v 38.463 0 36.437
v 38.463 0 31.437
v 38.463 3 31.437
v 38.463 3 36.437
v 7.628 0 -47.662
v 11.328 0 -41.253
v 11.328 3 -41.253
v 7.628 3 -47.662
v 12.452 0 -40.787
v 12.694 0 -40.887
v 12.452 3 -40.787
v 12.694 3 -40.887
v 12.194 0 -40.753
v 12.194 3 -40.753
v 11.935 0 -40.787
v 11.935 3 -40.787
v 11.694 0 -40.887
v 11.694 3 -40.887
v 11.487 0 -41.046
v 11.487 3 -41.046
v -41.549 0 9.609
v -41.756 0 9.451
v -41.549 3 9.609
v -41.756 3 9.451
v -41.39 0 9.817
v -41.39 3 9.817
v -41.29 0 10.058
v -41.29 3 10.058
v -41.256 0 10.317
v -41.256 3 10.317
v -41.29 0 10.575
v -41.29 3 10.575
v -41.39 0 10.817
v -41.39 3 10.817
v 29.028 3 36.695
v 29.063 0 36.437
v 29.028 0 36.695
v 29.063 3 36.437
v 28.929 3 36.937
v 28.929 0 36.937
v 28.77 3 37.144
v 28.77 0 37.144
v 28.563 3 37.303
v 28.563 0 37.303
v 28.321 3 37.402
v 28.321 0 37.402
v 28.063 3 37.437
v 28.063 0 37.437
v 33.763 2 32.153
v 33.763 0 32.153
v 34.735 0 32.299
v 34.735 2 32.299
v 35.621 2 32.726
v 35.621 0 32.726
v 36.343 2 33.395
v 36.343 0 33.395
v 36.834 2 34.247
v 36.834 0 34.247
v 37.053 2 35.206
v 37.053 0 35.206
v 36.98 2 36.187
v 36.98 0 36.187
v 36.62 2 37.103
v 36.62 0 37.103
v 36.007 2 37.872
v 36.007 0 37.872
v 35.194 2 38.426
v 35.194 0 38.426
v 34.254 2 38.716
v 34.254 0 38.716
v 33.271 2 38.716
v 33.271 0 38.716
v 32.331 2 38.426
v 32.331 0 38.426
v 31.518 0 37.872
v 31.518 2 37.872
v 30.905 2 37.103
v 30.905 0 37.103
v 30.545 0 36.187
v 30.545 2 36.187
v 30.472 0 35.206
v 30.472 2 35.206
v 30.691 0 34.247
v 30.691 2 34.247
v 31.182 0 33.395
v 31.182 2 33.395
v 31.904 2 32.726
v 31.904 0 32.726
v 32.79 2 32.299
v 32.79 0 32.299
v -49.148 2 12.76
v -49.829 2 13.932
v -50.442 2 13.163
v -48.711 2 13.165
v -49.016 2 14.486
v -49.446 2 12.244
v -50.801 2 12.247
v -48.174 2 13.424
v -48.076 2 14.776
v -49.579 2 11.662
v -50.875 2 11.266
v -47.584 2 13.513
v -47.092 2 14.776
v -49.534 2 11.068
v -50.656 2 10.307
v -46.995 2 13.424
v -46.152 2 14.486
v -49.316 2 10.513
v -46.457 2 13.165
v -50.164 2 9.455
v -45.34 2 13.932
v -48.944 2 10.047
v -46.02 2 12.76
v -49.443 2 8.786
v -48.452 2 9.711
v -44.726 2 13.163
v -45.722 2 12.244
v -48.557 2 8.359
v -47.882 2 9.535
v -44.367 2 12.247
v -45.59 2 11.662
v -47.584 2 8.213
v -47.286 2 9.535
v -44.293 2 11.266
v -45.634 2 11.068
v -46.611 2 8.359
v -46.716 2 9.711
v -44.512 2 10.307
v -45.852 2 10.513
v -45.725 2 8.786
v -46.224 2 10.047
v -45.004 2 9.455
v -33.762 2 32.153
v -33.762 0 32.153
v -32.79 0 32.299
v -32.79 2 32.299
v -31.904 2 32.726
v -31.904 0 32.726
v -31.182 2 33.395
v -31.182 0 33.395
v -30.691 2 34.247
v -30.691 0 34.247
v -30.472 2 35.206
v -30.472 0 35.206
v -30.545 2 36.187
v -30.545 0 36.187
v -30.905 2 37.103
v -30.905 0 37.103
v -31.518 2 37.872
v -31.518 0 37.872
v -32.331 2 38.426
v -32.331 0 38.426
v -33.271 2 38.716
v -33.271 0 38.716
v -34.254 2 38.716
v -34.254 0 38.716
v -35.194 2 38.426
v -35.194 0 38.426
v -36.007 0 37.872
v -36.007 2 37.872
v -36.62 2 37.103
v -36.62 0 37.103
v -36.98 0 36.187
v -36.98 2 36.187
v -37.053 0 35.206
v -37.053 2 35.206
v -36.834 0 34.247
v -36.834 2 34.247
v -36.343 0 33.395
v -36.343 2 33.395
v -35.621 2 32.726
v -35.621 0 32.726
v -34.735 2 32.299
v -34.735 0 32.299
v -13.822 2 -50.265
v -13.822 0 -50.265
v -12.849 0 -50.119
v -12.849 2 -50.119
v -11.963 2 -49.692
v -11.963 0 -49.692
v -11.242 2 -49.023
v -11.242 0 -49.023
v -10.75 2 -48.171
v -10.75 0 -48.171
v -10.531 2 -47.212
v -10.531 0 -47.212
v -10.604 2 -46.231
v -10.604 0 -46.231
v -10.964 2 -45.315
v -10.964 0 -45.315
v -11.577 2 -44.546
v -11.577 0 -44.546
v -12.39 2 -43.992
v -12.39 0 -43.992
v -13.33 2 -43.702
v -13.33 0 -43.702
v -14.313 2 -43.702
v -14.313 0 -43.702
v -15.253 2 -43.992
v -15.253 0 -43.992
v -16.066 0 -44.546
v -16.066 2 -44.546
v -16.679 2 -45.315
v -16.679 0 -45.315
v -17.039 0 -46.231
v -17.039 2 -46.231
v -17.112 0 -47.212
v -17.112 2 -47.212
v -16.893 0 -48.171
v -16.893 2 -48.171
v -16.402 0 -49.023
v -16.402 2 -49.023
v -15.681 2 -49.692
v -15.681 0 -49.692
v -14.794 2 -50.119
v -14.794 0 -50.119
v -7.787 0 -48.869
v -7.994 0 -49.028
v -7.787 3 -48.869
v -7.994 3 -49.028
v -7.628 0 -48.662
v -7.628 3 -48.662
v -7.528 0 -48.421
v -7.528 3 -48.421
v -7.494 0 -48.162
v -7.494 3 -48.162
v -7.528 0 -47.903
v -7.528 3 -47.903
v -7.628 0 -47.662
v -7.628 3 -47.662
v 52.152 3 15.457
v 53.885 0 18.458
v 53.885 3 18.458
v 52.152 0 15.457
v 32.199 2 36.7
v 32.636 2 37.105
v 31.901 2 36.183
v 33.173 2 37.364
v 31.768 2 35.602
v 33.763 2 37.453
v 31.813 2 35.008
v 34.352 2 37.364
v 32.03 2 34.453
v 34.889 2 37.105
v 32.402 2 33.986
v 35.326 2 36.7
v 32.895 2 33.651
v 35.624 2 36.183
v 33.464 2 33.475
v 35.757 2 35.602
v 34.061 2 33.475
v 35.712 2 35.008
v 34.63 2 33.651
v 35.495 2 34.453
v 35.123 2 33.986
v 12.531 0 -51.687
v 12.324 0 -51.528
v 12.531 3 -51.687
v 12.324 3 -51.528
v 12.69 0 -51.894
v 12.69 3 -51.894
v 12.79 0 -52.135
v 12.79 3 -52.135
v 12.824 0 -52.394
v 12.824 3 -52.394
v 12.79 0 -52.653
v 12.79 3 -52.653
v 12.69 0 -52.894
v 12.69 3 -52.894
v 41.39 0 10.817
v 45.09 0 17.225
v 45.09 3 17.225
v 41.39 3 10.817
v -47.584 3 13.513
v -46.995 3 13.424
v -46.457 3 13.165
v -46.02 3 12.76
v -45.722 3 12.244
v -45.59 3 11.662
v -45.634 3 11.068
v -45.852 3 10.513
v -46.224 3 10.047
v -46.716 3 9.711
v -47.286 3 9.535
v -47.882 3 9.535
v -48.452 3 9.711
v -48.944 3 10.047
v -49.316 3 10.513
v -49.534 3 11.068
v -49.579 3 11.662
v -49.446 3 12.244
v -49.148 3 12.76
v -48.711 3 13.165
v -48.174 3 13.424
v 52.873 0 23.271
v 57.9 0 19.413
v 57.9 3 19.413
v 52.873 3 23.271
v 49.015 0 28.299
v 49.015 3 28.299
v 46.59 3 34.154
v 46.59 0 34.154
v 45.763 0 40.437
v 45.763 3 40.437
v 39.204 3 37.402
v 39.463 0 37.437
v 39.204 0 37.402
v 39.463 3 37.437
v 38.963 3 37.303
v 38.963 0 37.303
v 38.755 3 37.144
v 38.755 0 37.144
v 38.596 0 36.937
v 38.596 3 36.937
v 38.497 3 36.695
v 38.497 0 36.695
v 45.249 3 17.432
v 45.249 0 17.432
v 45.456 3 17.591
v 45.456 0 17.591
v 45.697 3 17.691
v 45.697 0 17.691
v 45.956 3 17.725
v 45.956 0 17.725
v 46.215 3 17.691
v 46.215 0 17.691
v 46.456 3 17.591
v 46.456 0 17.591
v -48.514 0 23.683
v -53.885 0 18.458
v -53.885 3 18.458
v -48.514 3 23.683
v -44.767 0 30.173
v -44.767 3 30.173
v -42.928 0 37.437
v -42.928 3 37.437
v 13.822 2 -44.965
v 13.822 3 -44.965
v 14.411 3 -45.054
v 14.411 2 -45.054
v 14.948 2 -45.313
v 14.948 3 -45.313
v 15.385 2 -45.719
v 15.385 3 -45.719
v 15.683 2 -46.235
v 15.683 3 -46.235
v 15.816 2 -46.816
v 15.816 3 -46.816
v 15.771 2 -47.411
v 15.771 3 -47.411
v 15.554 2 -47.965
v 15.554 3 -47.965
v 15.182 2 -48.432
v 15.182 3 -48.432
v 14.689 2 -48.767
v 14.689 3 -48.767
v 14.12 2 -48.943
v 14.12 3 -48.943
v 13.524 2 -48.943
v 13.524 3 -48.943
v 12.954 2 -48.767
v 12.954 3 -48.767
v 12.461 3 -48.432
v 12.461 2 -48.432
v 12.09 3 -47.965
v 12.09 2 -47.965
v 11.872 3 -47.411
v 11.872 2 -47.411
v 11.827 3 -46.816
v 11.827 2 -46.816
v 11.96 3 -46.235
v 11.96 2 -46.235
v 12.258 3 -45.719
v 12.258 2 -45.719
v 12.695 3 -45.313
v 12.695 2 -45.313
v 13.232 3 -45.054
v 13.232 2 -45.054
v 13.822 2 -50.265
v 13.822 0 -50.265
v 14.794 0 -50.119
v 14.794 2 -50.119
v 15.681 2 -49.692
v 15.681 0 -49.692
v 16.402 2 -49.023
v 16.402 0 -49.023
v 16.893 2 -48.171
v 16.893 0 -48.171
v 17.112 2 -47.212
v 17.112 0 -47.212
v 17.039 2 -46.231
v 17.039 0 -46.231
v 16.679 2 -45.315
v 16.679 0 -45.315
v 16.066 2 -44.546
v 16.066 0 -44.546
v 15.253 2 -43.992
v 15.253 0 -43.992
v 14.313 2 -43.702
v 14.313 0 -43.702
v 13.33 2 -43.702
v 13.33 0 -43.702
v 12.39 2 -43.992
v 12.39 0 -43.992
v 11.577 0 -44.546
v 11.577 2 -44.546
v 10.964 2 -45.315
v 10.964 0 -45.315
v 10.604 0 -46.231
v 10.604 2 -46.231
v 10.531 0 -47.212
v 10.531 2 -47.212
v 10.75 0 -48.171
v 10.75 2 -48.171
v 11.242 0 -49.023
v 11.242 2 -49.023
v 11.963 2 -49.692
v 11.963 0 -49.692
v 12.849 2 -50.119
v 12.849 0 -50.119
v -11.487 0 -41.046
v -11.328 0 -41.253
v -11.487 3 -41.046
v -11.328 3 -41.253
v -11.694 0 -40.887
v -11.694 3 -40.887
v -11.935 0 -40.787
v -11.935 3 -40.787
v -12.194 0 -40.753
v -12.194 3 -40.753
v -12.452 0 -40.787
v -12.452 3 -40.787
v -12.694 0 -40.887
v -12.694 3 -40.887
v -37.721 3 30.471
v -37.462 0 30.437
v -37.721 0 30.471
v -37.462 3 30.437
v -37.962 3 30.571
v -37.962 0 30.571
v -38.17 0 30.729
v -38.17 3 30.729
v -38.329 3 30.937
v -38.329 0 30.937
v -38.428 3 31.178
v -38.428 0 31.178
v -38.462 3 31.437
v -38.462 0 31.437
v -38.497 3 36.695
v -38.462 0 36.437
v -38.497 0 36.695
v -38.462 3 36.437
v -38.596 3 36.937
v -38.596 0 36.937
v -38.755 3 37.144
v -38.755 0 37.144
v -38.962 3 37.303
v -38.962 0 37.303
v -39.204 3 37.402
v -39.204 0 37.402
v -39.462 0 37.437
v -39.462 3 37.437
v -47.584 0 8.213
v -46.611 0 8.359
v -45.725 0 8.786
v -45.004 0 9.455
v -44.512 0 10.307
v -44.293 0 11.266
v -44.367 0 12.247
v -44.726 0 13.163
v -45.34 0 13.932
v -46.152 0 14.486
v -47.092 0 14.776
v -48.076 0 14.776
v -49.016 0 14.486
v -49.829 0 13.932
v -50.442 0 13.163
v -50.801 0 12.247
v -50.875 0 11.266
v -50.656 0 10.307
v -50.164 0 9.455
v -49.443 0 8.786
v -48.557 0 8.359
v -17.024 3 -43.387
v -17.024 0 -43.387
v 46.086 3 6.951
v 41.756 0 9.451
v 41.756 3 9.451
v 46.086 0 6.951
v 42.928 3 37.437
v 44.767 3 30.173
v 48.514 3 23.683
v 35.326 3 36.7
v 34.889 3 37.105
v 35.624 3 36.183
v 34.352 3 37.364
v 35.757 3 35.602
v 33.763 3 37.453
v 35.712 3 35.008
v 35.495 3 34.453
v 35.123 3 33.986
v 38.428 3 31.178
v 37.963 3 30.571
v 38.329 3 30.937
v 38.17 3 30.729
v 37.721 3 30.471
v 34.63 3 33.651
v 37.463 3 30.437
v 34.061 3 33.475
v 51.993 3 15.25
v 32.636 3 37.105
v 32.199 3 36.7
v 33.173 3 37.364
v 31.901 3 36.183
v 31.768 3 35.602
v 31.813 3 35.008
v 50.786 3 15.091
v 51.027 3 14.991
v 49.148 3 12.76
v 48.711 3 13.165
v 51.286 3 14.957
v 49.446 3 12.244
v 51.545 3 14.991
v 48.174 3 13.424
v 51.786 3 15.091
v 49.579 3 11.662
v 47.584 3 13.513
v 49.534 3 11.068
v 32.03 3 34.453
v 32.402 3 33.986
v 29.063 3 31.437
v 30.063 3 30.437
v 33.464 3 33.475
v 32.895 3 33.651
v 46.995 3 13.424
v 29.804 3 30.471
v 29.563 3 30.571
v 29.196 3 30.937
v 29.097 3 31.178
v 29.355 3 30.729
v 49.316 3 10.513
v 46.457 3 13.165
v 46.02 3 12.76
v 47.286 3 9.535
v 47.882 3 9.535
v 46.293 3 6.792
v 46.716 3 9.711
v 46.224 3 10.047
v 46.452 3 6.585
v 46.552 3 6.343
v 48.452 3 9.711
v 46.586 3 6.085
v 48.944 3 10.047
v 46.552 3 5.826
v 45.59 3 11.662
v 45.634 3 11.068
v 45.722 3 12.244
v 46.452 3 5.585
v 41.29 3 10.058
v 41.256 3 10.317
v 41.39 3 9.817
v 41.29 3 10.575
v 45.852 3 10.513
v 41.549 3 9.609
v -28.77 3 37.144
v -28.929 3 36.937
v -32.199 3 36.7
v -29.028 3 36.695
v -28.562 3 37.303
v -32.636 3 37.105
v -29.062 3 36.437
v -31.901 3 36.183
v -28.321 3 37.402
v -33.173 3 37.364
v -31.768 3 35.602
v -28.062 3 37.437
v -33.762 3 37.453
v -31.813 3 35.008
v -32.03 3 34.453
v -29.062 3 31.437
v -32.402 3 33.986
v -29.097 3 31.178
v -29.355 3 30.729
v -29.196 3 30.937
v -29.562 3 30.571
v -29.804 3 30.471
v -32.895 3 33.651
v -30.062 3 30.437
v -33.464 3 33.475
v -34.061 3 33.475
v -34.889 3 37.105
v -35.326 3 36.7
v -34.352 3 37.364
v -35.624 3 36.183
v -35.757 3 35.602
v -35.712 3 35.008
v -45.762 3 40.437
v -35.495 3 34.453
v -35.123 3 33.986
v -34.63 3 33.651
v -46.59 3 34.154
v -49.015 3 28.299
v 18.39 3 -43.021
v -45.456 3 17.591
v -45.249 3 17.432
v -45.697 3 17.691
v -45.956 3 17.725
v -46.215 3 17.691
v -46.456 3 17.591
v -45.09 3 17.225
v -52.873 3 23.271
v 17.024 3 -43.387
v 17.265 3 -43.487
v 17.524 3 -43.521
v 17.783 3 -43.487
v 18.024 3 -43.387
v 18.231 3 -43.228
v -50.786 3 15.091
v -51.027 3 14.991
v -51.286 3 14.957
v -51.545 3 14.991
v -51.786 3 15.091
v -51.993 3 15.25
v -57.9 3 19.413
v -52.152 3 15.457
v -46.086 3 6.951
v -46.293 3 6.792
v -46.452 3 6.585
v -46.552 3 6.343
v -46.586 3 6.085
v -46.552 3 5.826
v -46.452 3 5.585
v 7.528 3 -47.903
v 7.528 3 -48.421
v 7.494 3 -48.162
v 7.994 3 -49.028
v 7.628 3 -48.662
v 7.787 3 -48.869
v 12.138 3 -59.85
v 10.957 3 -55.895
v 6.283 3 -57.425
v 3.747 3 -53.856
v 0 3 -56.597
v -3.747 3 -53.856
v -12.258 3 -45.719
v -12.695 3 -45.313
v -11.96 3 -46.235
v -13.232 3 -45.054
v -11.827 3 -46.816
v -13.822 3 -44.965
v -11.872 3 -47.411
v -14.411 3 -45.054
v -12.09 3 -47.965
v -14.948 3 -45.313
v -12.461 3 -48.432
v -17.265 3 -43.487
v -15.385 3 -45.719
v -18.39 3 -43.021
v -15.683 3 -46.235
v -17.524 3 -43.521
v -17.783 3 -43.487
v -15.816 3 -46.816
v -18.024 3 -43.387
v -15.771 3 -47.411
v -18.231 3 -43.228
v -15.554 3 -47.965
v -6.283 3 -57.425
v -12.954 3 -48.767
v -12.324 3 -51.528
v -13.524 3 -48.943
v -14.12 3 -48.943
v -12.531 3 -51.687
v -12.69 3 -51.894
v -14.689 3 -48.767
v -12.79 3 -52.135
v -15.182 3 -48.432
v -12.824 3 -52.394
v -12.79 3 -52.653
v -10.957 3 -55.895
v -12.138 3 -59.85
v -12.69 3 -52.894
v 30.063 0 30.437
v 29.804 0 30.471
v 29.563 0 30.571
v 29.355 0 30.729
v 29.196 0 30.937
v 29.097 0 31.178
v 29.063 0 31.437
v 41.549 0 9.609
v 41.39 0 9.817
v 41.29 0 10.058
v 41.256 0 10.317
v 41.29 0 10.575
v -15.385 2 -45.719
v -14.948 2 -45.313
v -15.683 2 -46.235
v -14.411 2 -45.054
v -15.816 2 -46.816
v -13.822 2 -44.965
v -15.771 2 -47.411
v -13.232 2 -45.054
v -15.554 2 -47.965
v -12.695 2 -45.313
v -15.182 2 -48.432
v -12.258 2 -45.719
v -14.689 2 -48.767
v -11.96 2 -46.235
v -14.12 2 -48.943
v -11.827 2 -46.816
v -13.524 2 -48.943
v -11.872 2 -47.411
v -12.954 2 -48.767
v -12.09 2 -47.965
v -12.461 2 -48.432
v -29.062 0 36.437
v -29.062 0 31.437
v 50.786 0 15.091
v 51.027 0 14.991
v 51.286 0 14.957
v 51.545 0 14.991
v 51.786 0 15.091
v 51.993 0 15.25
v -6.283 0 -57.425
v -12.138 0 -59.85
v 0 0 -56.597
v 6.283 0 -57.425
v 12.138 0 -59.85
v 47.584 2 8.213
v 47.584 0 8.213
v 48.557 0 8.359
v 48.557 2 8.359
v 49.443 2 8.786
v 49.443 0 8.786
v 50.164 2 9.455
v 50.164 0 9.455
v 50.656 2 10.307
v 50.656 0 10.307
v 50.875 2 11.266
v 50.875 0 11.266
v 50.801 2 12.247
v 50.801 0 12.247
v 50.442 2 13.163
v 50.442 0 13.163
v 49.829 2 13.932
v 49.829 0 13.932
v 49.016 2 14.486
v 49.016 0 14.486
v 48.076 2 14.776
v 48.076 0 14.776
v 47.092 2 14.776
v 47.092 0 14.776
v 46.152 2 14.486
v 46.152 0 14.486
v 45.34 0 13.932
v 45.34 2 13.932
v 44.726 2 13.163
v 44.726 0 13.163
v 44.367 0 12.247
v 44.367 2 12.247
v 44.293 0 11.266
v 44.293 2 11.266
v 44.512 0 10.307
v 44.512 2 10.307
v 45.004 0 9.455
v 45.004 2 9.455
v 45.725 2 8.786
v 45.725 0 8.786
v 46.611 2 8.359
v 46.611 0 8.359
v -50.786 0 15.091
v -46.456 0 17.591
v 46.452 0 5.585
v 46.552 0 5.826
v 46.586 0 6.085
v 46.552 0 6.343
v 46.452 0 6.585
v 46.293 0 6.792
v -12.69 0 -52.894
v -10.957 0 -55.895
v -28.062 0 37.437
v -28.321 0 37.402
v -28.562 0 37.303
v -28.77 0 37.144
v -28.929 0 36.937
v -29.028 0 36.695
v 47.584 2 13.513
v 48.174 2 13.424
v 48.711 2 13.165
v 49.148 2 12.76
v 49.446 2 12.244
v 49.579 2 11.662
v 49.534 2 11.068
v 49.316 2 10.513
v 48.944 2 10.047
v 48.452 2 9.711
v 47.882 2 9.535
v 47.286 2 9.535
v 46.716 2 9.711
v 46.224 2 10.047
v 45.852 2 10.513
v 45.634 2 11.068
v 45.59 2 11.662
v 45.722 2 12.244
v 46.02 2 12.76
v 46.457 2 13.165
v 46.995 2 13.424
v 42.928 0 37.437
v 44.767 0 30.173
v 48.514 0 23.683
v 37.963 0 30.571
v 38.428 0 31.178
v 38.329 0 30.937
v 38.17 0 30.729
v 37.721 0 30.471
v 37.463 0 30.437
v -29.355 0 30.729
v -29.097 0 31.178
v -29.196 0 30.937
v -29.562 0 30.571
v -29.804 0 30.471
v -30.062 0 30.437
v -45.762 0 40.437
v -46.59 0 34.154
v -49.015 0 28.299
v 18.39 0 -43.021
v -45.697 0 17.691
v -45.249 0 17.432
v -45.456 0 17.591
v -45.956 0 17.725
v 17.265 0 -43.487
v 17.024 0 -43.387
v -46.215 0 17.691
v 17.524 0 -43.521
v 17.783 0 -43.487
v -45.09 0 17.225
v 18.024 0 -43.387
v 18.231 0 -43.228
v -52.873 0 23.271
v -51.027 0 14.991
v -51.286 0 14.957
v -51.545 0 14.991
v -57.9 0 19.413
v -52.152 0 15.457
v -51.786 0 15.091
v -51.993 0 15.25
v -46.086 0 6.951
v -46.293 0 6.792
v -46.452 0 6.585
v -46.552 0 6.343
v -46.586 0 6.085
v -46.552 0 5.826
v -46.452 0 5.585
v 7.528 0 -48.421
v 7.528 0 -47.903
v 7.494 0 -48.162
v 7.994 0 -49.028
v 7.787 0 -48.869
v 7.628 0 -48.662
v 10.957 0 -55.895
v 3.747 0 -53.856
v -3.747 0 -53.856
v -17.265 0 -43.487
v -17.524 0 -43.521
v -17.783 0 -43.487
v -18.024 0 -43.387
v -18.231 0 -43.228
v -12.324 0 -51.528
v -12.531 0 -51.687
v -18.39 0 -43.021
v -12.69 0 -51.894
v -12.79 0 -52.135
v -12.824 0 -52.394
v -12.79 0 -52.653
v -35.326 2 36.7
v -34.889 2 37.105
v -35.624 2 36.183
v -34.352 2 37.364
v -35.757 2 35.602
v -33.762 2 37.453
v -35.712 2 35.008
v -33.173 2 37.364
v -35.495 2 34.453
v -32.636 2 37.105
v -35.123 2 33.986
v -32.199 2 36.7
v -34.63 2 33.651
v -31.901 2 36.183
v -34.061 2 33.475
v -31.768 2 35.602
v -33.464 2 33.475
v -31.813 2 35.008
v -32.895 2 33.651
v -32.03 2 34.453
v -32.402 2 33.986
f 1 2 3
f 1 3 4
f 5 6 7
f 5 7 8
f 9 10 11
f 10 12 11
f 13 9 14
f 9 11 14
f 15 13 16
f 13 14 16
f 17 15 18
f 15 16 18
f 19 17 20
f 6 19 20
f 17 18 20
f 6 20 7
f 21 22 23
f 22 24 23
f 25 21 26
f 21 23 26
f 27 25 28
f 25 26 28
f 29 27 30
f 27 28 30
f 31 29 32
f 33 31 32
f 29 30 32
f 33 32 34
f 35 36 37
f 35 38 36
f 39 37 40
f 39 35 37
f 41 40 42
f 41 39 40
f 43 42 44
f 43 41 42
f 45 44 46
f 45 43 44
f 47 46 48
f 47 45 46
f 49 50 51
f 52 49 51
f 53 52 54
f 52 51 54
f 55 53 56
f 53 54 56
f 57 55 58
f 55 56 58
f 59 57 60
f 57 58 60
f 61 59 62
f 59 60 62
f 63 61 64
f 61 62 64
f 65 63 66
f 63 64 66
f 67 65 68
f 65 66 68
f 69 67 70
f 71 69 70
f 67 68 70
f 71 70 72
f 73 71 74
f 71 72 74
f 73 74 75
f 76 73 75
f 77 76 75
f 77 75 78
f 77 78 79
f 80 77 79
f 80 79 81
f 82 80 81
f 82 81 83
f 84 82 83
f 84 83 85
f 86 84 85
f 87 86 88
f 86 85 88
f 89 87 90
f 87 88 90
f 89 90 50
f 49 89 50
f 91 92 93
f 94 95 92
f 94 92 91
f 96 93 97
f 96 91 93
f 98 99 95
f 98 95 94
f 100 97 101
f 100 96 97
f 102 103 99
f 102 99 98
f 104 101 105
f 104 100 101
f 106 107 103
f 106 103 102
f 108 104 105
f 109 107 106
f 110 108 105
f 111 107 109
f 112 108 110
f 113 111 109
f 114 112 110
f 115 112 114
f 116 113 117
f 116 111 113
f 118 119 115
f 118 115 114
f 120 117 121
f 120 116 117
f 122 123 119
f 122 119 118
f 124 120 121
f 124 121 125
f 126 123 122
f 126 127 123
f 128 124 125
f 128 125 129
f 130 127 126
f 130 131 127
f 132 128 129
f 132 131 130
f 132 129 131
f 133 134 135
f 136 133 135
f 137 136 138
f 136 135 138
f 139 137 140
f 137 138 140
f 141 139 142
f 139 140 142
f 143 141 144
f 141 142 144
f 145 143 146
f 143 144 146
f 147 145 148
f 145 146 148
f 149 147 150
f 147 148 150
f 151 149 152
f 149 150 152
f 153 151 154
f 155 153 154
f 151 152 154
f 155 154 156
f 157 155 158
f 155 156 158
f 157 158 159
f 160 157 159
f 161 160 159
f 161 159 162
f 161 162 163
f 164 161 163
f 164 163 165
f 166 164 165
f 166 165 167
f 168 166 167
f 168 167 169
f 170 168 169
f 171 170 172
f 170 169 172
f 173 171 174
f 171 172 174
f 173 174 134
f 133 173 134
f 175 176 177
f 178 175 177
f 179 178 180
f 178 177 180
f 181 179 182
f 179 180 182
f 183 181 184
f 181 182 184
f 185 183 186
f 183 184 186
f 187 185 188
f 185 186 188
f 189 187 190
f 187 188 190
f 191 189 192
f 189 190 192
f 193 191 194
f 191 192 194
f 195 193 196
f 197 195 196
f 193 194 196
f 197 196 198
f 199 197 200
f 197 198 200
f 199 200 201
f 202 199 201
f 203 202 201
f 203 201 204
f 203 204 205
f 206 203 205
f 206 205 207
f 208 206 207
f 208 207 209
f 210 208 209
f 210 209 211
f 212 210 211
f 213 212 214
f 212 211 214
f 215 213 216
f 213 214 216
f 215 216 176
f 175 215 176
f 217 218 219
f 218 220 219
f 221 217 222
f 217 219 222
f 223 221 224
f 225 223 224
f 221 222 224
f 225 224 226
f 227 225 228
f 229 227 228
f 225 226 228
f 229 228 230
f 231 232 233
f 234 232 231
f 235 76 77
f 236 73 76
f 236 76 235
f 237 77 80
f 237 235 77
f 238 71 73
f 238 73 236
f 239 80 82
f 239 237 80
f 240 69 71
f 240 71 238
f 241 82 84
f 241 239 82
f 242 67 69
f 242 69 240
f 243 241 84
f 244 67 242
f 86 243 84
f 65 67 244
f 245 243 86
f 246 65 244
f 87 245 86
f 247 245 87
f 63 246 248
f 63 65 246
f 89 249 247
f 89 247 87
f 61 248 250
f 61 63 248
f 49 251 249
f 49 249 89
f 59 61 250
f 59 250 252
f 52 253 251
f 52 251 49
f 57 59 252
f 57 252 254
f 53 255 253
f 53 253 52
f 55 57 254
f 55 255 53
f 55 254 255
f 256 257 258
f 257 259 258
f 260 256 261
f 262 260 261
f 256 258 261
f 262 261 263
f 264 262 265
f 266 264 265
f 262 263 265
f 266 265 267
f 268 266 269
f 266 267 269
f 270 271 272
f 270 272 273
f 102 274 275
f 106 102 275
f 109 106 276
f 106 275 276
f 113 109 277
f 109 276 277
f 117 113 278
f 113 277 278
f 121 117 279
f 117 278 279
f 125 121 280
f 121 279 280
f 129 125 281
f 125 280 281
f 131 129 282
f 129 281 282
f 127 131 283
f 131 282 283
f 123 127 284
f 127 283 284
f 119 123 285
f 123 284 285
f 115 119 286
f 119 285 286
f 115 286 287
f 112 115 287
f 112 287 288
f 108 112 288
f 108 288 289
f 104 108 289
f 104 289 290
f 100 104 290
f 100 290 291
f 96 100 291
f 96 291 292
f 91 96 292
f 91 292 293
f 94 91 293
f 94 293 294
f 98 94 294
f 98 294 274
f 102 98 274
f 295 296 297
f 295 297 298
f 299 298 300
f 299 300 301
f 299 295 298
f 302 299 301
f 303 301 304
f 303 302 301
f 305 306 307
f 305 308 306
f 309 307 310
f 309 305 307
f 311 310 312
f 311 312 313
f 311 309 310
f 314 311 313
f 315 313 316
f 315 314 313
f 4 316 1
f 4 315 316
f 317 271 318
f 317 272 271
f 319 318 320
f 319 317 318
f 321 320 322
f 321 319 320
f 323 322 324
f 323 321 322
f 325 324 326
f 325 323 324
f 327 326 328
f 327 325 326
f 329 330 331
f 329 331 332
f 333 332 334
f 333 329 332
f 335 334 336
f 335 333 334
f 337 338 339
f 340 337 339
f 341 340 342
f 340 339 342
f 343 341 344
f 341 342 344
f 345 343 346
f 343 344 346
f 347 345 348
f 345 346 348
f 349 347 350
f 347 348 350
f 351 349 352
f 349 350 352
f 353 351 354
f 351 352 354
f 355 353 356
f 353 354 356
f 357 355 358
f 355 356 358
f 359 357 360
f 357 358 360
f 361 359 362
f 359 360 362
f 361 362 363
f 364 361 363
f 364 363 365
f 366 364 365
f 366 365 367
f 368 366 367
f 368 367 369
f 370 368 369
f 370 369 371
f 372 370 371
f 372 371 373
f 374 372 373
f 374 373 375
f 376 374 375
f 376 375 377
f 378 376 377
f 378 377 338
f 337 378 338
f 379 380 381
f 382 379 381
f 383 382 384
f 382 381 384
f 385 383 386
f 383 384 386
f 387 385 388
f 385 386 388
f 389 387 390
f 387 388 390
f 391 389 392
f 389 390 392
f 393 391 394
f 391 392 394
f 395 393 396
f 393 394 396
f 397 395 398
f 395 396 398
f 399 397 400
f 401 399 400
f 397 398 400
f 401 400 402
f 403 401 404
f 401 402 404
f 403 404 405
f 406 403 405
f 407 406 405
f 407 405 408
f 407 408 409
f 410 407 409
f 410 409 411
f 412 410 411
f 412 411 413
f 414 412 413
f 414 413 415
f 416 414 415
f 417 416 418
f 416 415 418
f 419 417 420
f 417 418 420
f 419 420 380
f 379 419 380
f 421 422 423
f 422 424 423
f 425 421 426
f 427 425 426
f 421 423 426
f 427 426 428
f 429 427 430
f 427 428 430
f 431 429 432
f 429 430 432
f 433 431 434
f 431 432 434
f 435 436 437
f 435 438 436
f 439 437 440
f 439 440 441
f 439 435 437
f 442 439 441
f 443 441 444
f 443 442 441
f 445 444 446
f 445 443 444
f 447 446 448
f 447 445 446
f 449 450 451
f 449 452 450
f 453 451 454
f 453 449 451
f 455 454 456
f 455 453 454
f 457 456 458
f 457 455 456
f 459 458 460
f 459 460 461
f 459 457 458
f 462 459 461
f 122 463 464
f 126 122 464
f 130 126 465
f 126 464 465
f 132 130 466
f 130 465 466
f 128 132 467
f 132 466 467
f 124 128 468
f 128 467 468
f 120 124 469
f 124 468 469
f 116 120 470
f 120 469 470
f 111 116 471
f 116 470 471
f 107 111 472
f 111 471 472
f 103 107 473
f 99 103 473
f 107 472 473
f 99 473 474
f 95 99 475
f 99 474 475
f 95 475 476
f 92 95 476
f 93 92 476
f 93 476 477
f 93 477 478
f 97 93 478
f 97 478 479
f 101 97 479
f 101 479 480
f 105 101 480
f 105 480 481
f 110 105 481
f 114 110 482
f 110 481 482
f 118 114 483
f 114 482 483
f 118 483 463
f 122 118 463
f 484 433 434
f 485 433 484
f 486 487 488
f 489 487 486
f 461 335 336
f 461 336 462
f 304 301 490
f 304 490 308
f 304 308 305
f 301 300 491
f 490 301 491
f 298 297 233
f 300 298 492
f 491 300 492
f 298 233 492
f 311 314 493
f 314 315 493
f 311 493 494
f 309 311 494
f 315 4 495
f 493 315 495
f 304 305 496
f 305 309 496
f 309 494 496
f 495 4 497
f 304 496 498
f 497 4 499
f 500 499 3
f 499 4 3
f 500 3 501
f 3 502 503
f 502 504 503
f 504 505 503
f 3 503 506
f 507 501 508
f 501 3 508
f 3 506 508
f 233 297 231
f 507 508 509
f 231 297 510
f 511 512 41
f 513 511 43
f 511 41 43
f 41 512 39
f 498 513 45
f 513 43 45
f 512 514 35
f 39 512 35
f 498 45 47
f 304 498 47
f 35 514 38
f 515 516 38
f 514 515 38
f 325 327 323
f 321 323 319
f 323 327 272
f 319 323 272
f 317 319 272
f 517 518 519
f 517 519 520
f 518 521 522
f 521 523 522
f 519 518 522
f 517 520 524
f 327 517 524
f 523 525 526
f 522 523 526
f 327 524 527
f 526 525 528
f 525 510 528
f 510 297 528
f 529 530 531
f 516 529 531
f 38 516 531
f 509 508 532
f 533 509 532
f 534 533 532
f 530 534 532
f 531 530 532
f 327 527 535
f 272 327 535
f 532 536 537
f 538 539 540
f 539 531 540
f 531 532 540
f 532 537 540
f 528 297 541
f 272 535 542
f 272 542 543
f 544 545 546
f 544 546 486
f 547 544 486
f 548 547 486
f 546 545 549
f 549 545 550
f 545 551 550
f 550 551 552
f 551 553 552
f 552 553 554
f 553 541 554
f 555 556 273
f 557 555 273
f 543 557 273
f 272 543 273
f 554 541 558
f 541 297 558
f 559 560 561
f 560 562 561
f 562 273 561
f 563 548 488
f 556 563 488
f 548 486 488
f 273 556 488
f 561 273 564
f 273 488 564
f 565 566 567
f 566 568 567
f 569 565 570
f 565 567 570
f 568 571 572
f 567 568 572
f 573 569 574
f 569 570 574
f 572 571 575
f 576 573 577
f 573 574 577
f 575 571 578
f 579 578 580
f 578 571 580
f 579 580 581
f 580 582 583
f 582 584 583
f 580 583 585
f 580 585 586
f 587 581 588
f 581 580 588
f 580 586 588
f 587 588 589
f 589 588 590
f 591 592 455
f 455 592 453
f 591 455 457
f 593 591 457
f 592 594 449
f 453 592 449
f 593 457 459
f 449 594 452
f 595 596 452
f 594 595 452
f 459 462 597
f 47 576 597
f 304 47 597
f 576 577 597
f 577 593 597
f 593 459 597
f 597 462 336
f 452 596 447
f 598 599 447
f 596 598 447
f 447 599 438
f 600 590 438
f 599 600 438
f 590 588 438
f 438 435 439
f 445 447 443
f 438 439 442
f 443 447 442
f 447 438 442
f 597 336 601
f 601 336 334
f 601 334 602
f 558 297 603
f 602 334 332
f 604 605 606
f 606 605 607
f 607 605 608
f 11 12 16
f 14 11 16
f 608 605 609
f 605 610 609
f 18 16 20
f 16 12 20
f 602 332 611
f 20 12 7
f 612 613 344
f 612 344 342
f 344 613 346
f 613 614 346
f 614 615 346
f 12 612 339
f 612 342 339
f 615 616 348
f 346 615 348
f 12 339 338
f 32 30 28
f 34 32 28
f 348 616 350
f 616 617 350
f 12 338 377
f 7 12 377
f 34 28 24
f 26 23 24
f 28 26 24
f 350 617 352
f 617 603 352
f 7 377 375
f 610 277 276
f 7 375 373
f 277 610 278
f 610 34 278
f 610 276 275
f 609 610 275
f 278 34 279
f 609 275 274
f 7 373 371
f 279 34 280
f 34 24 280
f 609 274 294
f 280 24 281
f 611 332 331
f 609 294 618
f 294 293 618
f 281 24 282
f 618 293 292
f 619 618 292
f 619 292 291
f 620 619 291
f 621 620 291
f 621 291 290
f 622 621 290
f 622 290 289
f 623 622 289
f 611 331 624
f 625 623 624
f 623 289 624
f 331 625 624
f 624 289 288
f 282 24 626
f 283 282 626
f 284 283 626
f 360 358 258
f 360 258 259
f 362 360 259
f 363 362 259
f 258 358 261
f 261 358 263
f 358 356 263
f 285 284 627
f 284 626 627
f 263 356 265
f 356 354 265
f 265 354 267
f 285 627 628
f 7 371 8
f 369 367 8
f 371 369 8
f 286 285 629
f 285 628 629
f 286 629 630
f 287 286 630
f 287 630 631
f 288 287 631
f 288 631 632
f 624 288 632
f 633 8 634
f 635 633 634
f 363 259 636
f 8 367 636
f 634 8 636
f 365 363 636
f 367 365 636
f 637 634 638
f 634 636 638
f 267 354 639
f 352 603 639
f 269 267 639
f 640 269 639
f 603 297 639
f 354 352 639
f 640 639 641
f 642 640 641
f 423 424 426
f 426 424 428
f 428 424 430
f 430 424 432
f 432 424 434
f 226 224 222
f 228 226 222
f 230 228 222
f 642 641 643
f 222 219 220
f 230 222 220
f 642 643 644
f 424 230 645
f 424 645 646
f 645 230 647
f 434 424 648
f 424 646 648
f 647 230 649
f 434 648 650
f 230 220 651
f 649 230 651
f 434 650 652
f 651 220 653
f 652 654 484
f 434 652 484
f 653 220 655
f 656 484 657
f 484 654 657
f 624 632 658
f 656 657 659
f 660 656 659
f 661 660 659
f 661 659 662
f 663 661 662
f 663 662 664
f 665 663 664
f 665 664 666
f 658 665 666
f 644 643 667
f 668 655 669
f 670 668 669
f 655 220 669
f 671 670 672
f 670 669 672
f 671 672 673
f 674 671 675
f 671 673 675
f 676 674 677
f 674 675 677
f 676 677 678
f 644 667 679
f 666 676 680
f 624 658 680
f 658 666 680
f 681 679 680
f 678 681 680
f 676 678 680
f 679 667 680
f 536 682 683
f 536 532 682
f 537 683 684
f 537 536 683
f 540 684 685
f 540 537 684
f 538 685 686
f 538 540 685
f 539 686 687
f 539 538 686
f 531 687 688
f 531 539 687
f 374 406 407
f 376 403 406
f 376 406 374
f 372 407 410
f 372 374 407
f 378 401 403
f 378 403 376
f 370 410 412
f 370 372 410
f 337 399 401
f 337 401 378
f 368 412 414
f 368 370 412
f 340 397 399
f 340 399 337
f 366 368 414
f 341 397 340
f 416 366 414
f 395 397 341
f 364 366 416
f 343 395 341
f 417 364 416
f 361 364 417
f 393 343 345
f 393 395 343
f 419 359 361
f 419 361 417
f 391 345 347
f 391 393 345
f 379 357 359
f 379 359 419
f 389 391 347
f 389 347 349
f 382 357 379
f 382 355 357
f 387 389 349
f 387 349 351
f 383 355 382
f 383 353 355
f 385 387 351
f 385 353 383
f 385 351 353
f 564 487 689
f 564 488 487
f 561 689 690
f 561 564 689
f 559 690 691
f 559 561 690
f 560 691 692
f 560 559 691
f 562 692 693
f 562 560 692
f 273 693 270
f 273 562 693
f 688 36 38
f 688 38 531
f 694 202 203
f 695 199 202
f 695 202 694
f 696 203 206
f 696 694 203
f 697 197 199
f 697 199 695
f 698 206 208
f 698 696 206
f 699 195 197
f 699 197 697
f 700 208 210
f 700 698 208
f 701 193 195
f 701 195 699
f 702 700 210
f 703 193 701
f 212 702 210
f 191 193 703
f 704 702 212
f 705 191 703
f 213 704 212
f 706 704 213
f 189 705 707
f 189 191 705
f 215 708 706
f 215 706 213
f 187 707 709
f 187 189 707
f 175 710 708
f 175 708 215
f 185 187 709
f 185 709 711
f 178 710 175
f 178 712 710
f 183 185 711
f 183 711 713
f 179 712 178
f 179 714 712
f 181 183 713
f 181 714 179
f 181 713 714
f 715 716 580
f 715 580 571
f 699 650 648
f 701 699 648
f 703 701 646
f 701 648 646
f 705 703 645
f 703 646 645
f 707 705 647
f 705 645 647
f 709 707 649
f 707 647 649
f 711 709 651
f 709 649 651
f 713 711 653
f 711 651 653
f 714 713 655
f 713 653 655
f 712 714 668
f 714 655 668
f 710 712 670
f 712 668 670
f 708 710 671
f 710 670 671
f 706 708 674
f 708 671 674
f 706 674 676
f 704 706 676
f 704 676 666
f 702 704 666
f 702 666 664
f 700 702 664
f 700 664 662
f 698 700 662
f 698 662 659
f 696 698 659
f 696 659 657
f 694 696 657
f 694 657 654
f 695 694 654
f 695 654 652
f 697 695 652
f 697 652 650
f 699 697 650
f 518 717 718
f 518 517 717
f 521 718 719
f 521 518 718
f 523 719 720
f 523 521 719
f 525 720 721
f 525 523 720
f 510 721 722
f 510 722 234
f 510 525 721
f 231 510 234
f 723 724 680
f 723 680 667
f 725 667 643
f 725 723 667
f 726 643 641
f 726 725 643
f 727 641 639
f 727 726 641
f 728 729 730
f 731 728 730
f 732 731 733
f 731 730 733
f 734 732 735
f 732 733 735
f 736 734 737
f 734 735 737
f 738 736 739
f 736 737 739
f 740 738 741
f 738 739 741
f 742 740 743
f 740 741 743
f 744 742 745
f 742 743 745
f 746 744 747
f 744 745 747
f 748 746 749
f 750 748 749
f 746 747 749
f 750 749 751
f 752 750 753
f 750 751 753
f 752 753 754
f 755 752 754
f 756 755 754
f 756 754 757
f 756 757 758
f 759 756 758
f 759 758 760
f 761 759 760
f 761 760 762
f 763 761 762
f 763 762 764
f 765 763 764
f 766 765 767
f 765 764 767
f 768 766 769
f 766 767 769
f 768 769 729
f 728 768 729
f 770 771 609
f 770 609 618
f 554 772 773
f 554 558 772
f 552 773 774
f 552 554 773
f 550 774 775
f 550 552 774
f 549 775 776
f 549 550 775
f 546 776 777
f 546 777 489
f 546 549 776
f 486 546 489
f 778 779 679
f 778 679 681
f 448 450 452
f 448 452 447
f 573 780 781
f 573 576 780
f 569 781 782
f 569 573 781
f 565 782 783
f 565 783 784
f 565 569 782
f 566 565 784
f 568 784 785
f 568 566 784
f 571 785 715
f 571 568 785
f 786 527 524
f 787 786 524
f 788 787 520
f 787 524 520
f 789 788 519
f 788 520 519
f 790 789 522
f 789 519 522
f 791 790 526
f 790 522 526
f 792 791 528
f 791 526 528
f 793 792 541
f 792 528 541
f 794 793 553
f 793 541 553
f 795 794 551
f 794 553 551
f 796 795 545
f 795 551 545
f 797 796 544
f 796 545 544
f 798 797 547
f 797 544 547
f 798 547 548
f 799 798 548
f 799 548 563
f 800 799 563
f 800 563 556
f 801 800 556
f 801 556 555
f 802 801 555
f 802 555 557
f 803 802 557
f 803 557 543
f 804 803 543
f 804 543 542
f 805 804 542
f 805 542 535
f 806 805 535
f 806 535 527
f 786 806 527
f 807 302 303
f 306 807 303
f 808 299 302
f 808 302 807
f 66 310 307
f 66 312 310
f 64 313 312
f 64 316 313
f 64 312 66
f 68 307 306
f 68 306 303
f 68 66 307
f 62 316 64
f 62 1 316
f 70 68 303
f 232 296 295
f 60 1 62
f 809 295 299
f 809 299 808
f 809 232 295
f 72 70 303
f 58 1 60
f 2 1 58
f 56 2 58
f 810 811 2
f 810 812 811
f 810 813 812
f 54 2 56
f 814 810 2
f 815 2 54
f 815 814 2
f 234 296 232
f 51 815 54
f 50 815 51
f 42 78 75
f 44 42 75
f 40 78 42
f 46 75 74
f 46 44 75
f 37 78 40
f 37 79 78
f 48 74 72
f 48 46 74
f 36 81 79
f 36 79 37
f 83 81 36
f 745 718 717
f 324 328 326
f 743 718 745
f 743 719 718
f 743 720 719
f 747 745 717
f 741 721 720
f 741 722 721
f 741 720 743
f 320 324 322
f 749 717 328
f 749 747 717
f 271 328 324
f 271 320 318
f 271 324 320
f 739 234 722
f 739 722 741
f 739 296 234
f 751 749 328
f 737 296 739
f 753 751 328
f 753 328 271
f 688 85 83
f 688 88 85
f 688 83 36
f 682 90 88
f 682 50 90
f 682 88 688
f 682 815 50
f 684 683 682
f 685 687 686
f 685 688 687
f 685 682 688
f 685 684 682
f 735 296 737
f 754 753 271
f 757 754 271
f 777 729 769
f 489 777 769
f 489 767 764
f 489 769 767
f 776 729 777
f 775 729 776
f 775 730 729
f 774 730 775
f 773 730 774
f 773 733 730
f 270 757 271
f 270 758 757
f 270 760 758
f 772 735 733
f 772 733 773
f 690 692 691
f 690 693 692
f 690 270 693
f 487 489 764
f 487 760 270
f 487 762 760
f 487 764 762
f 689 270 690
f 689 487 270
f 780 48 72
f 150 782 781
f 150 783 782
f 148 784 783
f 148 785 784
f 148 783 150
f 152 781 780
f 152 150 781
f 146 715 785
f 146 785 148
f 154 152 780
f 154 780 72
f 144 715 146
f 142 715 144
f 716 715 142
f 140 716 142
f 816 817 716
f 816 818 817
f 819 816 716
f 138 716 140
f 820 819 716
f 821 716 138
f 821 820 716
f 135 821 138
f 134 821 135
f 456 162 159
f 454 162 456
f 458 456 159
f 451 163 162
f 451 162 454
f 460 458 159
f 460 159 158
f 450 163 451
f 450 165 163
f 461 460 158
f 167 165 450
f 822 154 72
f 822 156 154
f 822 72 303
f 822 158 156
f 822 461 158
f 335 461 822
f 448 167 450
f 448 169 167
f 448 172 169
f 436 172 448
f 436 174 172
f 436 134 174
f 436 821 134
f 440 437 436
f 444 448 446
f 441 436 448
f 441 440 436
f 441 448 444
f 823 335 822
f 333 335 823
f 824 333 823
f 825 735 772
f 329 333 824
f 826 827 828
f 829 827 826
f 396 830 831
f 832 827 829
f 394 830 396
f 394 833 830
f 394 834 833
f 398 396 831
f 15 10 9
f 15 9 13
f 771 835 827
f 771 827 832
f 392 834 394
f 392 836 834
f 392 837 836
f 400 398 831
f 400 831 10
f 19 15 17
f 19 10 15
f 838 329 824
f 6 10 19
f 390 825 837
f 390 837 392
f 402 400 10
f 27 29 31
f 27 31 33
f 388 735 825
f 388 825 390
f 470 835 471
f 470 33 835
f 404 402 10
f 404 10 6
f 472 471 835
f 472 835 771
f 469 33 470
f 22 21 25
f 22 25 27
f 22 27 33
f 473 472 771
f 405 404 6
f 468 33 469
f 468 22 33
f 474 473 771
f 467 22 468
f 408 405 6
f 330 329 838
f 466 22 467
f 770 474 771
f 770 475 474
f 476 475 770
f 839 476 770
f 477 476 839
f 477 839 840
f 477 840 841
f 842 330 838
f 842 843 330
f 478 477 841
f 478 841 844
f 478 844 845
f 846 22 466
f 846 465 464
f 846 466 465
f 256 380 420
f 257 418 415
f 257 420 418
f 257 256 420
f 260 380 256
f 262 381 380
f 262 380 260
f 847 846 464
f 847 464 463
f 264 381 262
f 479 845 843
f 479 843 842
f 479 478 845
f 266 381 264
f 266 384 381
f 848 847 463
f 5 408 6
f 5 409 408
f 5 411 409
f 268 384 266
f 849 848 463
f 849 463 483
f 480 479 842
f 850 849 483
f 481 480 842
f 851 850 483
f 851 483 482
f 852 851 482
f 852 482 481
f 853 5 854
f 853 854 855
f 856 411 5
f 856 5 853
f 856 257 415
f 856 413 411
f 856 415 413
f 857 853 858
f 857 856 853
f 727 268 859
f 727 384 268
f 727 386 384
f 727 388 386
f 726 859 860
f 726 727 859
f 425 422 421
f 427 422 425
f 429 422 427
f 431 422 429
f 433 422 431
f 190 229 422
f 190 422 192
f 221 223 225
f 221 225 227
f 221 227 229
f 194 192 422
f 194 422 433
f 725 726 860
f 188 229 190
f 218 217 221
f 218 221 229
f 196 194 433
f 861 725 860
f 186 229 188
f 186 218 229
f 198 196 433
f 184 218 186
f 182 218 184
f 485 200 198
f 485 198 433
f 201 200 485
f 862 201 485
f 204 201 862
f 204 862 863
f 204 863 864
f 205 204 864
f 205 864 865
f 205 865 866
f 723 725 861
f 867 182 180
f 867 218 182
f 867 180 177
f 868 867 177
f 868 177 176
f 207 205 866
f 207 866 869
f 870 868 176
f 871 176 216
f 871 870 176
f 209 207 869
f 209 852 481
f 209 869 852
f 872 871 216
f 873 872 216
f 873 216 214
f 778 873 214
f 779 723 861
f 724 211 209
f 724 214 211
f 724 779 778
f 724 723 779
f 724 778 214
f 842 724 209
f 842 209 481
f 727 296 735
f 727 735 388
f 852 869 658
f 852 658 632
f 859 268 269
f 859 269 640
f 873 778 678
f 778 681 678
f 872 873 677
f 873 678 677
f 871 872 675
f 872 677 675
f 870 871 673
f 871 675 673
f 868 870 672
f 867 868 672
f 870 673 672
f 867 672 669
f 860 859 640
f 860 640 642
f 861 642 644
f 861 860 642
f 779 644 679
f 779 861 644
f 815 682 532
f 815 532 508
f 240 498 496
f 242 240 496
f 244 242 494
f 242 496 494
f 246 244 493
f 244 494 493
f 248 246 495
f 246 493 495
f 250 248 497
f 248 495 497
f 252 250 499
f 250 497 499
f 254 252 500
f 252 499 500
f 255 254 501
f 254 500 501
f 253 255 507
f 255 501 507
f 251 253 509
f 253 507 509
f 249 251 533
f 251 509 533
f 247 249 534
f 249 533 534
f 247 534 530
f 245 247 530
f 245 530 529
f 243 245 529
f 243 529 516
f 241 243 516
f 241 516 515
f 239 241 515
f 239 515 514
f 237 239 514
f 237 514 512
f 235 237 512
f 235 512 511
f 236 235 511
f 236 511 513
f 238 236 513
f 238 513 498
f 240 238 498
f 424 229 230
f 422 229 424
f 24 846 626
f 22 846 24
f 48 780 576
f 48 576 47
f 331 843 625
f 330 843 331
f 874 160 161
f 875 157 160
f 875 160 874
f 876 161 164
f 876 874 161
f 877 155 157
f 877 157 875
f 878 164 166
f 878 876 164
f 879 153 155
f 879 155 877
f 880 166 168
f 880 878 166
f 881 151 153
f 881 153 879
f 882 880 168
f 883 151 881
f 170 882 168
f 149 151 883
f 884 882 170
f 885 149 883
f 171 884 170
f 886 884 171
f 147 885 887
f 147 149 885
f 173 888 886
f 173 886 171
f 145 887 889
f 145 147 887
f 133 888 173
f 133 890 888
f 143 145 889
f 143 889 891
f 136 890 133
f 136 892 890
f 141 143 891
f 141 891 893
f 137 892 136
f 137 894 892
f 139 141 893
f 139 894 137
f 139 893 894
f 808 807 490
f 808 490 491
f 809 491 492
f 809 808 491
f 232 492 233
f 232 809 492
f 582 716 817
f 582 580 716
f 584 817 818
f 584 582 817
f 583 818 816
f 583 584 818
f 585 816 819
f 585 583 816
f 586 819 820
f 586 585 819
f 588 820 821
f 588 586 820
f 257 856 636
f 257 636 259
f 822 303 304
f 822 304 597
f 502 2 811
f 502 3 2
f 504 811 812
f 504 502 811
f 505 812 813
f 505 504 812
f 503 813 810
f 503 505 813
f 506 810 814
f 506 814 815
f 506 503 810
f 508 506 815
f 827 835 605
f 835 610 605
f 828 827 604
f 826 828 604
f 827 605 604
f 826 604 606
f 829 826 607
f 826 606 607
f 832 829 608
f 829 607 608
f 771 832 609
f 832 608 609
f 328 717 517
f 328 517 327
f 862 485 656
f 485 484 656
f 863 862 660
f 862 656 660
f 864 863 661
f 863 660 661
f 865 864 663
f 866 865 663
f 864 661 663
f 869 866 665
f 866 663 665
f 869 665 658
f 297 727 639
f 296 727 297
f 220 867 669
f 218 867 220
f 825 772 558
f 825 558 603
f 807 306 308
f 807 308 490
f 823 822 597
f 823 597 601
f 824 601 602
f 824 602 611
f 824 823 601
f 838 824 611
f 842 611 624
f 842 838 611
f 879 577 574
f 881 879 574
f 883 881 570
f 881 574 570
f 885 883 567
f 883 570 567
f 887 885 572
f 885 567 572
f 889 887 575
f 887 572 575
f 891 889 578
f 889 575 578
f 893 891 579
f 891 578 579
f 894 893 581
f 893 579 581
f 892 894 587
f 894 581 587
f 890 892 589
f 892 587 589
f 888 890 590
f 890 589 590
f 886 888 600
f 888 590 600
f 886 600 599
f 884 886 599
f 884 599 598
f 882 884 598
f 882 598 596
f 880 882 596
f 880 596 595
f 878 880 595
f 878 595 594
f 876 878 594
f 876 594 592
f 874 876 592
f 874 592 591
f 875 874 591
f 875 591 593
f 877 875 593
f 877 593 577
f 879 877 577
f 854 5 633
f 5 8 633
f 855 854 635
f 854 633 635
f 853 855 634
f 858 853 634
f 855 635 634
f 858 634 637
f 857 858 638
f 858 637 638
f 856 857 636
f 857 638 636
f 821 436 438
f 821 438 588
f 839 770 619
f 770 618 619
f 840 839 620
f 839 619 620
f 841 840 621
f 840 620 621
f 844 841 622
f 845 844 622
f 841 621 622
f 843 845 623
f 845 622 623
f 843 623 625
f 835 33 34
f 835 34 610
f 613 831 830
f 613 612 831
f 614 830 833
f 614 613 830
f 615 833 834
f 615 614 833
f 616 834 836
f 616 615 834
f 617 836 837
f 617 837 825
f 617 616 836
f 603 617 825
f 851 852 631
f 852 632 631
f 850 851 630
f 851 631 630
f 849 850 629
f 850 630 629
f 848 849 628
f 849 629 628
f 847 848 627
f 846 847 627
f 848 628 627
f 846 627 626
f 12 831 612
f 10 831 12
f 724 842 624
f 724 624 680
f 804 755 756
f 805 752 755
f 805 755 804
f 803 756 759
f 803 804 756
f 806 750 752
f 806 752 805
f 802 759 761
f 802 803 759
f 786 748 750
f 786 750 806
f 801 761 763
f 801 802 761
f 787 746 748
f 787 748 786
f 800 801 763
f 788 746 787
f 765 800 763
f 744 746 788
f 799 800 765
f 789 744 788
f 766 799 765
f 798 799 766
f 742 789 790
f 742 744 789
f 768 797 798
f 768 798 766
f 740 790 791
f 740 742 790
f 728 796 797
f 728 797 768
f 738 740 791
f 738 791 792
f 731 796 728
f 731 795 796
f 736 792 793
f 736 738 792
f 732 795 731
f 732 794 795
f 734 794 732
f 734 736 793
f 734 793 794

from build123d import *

# Parameters (mm, degrees)
BOSS_EXTRUDE2_DEPTH = 3
SKETCH3_R           = 2.0000000000000036
SKETCH3_R_2         = 1.9999999999999967
SKETCH3_R_3         = 2.0000000000000027
SKETCH3_R_4         = 2.0000000000000018
CUT_EXTRUDE1_DEPTH  = 84.32734015621716
FILLET2_R           = 1
SKETCH5_R           = 3.299999999999997
SKETCH5_R_2         = 3.3000000000000003
SKETCH5_R_3         = 3.2999999999998377
CUT_EXTRUDE3_DEPTH  = 2


with BuildPart() as part:
    # Sketch2 → Boss-Extrude2 (new body)
    with BuildSketch(Plane(origin=(0, 0, 0), x_dir=(1, 0, 0), z_dir=(0, 1, 0))):
        with BuildLine():
            Line((-57.900347822426866, -19.41320198612938), (-45.90034782242687, 1.3714077046971502))
            Line((-45.90034782242687, 1.3714077046971502), (-24.137847822426874, 39.065163404414825))
            Line((-24.137847822426874, 39.065163404414825), (-12.137847822426867, 59.849773095241346))
            ThreePointArc((-12.137847822426867, 59.849773095241346), (-2.0632e-13, 56.59744657337059), (12.137847822426314, 59.849773095241474))
            Line((12.137847822426314, 59.849773095241474), (24.13784782242651, 39.06516340441507))
            Line((24.13784782242651, 39.06516340441507), (45.90034782242685, 1.3714077046975783))
            Line((45.90034782242685, 1.3714077046975783), (57.90034782242704, -19.413201986128836))
            ThreePointArc((57.90034782242704, -19.413201986128836), (49.014826521872, -28.298723286684716), (45.76250000000075, -40.43657110911115))
            Line((45.76250000000075, -40.43657110911115), (21.762500000000745, -40.43657110911158))
            Line((21.762500000000745, -40.43657110911158), (-21.762499999999243, -40.436571109112386))
            Line((-21.762499999999243, -40.436571109112386), (-45.762499999999235, -40.43657110911281))
            ThreePointArc((-45.762499999999235, -40.43657110911281), (-49.01482652187049, -28.298723286685338), (-57.900347822426866, -19.41320198612938))
        make_face()
        with BuildLine():
            Line((11.82759378458235, 40.3871488520415), (11.32759378458234, 41.25317425582594))
            Line((11.32759378458234, 41.25317425582594), (7.1275937845823325, 48.52778764761524))
            Line((7.1275937845823325, 48.52778764761524), (13.189771611073091, 52.02778764761513))
            Line((13.189771611073091, 52.02778764761513), (10.95702958785254, 55.895010272027164))
            ThreePointArc((10.95702958785254, 55.895010272027164), (-3.1e-14, 53.59744657337001), (-10.95702958785254, 55.895010272027164))
            Line((-10.95702958785254, 55.895010272027164), (-13.189771611074285, 52.0277876476148))
            Line((-13.189771611074285, 52.0277876476148), (-7.127593784582693, 48.52778764761462))
            Line((-7.127593784582693, 48.52778764761462), (-11.327593784582492, 41.25317425582568))
            Line((-11.327593784582492, 41.25317425582568), (-11.827593784582703, 40.38714885204087))
            Line((-11.827593784582703, 40.38714885204087), (-17.889771611074185, 43.88714885204099))
            Line((-17.889771611074185, 43.88714885204099), (-21.53977161107411, 37.56516340441455))
            Line((-21.53977161107411, 37.56516340441455), (-43.30227161107358, -0.12859229530344518))
            Line((-43.30227161107358, -0.12859229530344518), (-46.95227161107352, -6.450577742929913))
            Line((-46.95227161107352, -6.450577742929913), (-40.890093784582575, -9.950577742929706))
            Line((-40.890093784582575, -9.950577742929706), (-45.59009378458257, -18.091216538503463))
            Line((-45.59009378458257, -18.091216538503463), (-51.65227161107341, -14.591216538503707))
            Line((-51.65227161107341, -14.591216538503707), (-53.88501363429374, -18.458439162915578))
            ThreePointArc((-53.88501363429374, -18.458439162915578), (-46.4167503105172, -26.798723286685323), (-42.92798404644063, -37.43657110911222))
            Line((-42.92798404644063, -37.43657110911222), (-38.46249999999932, -37.436571109112705))
            Line((-38.46249999999932, -37.436571109112705), (-38.46249999999945, -30.436571109112176))
            Line((-38.46249999999945, -30.436571109112176), (-30.062499999999865, -30.436571109112133))
            Line((-30.062499999999865, -30.436571109112133), (-29.062499999999424, -30.43657110911213))
            Line((-29.062499999999424, -30.43657110911213), (-29.062499999999286, -37.43657110911253))
            Line((-29.062499999999286, -37.43657110911253), (-21.762499999999292, -37.43657110911241))
            Line((-21.762499999999292, -37.43657110911241), (21.762500000000696, -37.4365711091116))
            Line((21.762500000000696, -37.4365711091116), (29.062500000000714, -37.436571109111476))
            Line((29.062500000000714, -37.436571109111476), (29.062500000000565, -30.436571109111707))
            Line((29.062500000000565, -30.436571109111707), (38.46250000000059, -30.436571109111636))
            Line((38.46250000000059, -30.436571109111636), (38.46250000000072, -37.436571109111306))
            Line((38.46250000000072, -37.436571109111306), (42.927984046442106, -37.43657110911252))
            ThreePointArc((42.927984046442106, -37.43657110911252), (46.41675031051867, -26.798723286684776), (53.88501363429554, -18.458439162914214))
            Line((53.88501363429554, -18.458439162914214), (51.65227161107371, -14.591216538502506))
            Line((51.65227161107371, -14.591216538502506), (45.59009378458266, -18.09121653850257))
            Line((45.59009378458266, -18.09121653850257), (40.890093784582604, -9.950577742928846))
            Line((40.890093784582604, -9.950577742928846), (46.95227161107361, -6.450577742928804))
            Line((46.95227161107361, -6.450577742928804), (43.30227161107357, -0.12859229530243052))
            Line((43.30227161107357, -0.12859229530243052), (21.539771611073228, 37.565163404415046))
            Line((21.539771611073228, 37.565163404415046), (17.88977161107317, 43.88714885204144))
            Line((17.88977161107317, 43.88714885204144), (11.82759378458235, 40.3871488520415))
        make_face(mode=Mode.SUBTRACT)
    extrude(amount=BOSS_EXTRUDE2_DEPTH)

    # Sketch3 → Cut-Extrude1 (cut, through all)
    with BuildSketch(Plane(origin=(0, 3, 0), x_dir=(1, 0, 0), z_dir=(0, 1, 0))):
        with Locations(Location((33.762500000000074, -35.45259651289613, 0), (0, 0, 270))):
            Circle(SKETCH3_R)
        with Locations(Location((-33.76249999999959, -35.45259651289661, 0), (0, 0, 270))):
            Circle(SKETCH3_R_2)
        with Locations(Location((-47.58409921028776, -11.5128844388239, 0), (0, 0, 270))):
            Circle(SKETCH3_R_3)
        with Locations(Location((47.58409921028791, -11.512884438823233, 0), (0, 0, 270))):
            Circle(SKETCH3_R_3)
        with Locations(Location((13.821599210288047, 46.96548095172012, 0), (0, 0, 270))):
            Circle(SKETCH3_R)
        with Locations(Location((-13.821599210288047, 46.96548095172012, 0), (0, 0, 270))):
            Circle(SKETCH3_R_4)
    extrude(amount=-CUT_EXTRUDE1_DEPTH, mode=Mode.SUBTRACT)

    # Fillet2
    fillet2_edges = [part.edges().sort_by_distance(p)[0] for p in [
        (-46.95227161107352, 1.5, 6.450577742929913),
        (-40.890093784582575, 1.5, 9.950577742929706),
        (-45.59009378458257, 1.5, 18.091216538503463),
        (-51.65227161107341, 1.5, 14.591216538503707),
        (-38.46249999999932, 1.5, 37.436571109112705),
        (-38.46249999999945, 1.5, 30.436571109112176),
        (-29.062499999999424, 1.5, 30.43657110911213),
        (-29.062499999999286, 1.5, 37.43657110911253),
        (29.062500000000714, 1.5, 37.436571109111476),
        (29.062500000000565, 1.5, 30.436571109111707),
        (38.46250000000059, 1.5, 30.436571109111636),
        (38.46250000000072, 1.5, 37.436571109111306),
        (51.65227161107371, 1.5, 14.591216538502506),
        (45.59009378458266, 1.5, 18.09121653850257),
        (40.890093784582604, 1.5, 9.950577742928846),
        (46.95227161107361, 1.5, 6.450577742928804),
        (17.88977161107317, 1.5, -43.88714885204144),
        (11.82759378458235, 1.5, -40.3871488520415),
        (7.1275937845823325, 1.5, -48.52778764761524),
        (13.189771611073091, 1.5, -52.02778764761513),
        (-13.189771611074285, 1.5, -52.0277876476148),
        (-7.127593784582693, 1.5, -48.52778764761462),
        (-11.827593784582703, 1.5, -40.38714885204087),
        (-17.889771611074185, 1.5, -43.88714885204099),
    ]]
    fillet(fillet2_edges, radius=FILLET2_R)

    # Sketch5 → Cut-Extrude3 (cut)
    with BuildSketch(Plane.XZ):
        with Locations(Location((47.58409921028791, 11.512884438823233, 0), (0, 0, 270))):
            Circle(SKETCH5_R)
        with Locations(Location((33.762500000000074, 35.45259651289613, 0), (0, 0, 270))):
            Circle(SKETCH5_R)
        with Locations(Location((-13.821599210288472, -46.96548095172, 0), (0, 0, 270))):
            Circle(SKETCH5_R_2)
        with Locations(Location((13.821599210287625, -46.96548095172023, 0), (0, 0, 270))):
            Circle(SKETCH5_R_2)
        with Locations(Location((-33.76249999999945, 35.45259651289674, 0), (0, 0, 270))):
            Circle(SKETCH5_R)
        with Locations(Location((-47.5840992102877, 11.512884438824086, 0), (0, 0, 270))):
            Circle(SKETCH5_R_3)
    extrude(amount=-CUT_EXTRUDE3_DEPTH, mode=Mode.SUBTRACT)


solid = part.part
